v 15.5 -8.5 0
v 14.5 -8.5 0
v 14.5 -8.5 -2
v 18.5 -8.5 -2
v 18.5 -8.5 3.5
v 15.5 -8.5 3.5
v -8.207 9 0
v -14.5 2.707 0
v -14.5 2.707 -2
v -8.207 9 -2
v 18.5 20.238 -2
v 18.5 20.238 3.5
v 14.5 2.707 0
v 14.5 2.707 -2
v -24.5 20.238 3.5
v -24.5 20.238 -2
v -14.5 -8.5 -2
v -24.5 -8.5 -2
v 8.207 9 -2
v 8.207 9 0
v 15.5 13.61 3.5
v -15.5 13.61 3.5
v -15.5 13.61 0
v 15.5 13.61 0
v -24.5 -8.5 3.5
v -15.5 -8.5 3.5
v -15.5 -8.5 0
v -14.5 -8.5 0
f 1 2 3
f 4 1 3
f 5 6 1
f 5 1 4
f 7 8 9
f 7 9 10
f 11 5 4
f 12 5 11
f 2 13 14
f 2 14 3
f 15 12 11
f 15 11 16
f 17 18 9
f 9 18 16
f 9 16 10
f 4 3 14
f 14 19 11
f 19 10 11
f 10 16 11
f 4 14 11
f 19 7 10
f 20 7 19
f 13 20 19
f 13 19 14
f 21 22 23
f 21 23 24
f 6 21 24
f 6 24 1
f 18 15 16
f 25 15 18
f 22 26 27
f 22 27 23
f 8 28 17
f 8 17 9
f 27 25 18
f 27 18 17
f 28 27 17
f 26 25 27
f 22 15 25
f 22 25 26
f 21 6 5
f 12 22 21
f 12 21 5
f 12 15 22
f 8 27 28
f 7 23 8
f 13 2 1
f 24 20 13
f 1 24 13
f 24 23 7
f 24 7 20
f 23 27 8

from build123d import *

# Parameters (mm, degrees)
F1_DEPTH = 3.5
F2_DEPTH = 2
F3_DEPTH = 1.5


with BuildPart() as f1:
    # F0 (on Top) → F1 (new body, symmetric)
    with BuildSketch(Plane.XY):
        Polygon((15.5, 13.61), (15.5, -8.5), (18.5, -8.5), (18.5, 20.237967), (-24.5, 20.237967), (-24.5, -8.5), (-15.5, -8.5), (-15.5, 13.61), align=None)
    extrude(amount=F1_DEPTH, both=True)

    # F0 (on Top) → F2 (join)
    with BuildSketch(Plane.XY):
        Polygon((8.207107, 9), (14.5, 2.707107), (14.5, -8.5), (15.5, -8.5), (15.5, 13.61), (-15.5, 13.61), (-15.5, -8.5), (-14.5, -8.5), (-14.5, 2.707107), (-8.207107, 9), align=None)
    extrude(amount=-F2_DEPTH)

    # F1_face (on face) → F3 (cut)
    with BuildSketch(Plane(origin=(-6.736408, 9.996449, -3.5), x_dir=(1, 0, 0), z_dir=(0, 0, -1))):
        Polygon((22.236408, 18.496449), (22.236408, -3.613551), (-8.763592, -3.613551), (-8.763592, 18.496449), (-17.763592, 18.496449), (-17.763592, -10.241518), (25.236408, -10.241518), (25.236408, 18.496449), align=None)
    extrude(amount=-F3_DEPTH, mode=Mode.SUBTRACT)


solid = f1.part
